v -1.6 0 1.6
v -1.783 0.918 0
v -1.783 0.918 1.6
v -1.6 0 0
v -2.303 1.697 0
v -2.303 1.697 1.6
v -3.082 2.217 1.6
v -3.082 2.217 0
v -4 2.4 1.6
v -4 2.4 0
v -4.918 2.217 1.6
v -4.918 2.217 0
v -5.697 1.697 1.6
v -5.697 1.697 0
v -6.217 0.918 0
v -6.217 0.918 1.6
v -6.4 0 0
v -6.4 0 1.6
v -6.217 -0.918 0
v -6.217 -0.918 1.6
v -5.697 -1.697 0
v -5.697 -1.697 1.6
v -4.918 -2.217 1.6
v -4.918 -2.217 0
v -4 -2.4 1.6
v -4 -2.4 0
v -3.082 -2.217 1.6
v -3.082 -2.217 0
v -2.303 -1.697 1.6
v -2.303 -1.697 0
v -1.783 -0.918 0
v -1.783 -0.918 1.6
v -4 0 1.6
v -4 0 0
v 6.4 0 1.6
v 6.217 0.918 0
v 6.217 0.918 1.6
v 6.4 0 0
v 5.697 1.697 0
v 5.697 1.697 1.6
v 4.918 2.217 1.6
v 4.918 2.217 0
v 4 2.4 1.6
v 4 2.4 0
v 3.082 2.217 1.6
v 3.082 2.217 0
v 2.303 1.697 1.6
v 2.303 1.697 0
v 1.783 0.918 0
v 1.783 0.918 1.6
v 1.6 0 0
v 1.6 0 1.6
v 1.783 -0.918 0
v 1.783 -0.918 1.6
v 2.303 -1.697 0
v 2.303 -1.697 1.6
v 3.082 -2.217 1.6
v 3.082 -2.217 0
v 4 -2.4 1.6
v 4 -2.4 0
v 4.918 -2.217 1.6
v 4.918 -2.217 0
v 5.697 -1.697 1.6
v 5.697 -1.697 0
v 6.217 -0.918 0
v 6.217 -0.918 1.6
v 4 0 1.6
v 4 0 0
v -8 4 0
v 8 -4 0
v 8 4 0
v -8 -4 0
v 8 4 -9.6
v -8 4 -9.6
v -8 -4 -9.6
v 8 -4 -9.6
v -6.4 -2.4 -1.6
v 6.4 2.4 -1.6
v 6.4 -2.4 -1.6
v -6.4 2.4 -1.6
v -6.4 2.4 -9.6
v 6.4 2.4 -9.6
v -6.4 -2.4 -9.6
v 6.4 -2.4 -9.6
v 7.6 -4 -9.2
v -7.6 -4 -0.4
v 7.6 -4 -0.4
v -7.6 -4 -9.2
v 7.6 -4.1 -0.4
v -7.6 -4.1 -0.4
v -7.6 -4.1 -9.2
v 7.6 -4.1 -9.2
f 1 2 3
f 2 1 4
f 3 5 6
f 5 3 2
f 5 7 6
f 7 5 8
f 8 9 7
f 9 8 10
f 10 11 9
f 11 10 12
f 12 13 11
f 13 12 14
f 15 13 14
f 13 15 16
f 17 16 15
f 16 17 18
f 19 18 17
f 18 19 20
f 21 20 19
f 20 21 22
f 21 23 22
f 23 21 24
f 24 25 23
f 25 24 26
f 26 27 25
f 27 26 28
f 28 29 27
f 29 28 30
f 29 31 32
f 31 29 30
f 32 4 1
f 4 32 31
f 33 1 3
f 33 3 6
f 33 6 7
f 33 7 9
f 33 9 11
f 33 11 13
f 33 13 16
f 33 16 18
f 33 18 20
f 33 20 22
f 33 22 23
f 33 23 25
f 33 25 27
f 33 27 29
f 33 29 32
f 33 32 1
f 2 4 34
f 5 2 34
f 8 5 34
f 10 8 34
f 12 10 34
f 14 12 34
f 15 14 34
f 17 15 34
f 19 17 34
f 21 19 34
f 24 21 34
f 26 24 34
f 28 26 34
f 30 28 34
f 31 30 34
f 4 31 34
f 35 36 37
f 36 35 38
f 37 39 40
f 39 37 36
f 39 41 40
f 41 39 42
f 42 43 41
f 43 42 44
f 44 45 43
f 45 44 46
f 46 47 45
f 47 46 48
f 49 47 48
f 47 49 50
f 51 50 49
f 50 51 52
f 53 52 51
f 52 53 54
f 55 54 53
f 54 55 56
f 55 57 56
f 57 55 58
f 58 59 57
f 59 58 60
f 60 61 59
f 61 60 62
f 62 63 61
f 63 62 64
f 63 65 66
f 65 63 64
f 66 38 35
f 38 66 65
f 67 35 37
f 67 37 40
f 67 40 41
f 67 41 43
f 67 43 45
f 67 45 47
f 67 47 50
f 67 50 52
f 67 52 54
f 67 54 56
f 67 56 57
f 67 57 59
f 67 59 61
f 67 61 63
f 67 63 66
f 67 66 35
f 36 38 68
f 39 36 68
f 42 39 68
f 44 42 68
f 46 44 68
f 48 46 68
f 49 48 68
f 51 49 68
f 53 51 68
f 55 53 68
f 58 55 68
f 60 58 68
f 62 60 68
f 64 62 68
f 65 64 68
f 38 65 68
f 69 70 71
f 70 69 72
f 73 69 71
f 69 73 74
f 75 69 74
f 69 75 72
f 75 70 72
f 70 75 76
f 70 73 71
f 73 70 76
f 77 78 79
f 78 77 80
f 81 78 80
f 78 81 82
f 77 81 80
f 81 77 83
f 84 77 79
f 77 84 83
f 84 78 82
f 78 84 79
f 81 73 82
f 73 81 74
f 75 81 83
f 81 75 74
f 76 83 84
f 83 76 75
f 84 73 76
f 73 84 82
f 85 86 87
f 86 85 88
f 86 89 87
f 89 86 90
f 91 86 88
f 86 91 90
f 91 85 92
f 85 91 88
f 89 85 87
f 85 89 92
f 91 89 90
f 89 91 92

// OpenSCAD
// file: ../p/4-4edge.scad
use <../lib.scad>
function ldraw_lib__4_4edge() = [
// 0 Circle 1.0
// 0 Name: 4-4edge.dat
// 0 Author: James Jessiman
// 0 !LDRAW_ORG Primitive UPDATE 2017-01
// 0 !LICENSE Licensed under CC BY 2.0 and CC BY 4.0 : see CAreadme.txt
// 
// 0 BFC CERTIFY CCW
  [0,"BFC","CERTIFY"],
  [0,"BFC","CCW"],
// 
// 0 !HISTORY 1998-12-15 [PTadmin] Official Update 1998-10
// 0 !HISTORY 2005-12-28 [PTadmin] Official Update 2005-01
// 0 !HISTORY 2007-06-24 [PTadmin] Header formatted for Contributor Agreement
// 0 !HISTORY 2008-07-01 [PTadmin] Official Update 2008-01
// 0 !HISTORY 2017-01-15 [Steffen] BFCed
// 0 !HISTORY 2017-12-30 [PTadmin] Official Update 2017-01
// 
// 
// 2 24 1 0 0 0.9239 0 0.3827
  [2,24,1,0,0,0.9239,0,0.3827],
// 2 24 0.9239 0 0.3827 0.7071 0 0.7071
  [2,24,0.9239,0,0.3827,0.7071,0,0.7071],
// 2 24 0.7071 0 0.7071 0.3827 0 0.9239
  [2,24,0.7071,0,0.7071,0.3827,0,0.9239],
// 2 24 0.3827 0 0.9239 0 0 1
  [2,24,0.3827,0,0.9239,0,0,1],
// 2 24 0 0 1 -0.3827 0 0.9239
  [2,24,0,0,1,-0.3827,0,0.9239],
// 2 24 -0.3827 0 0.9239 -0.7071 0 0.7071
  [2,24,-0.3827,0,0.9239,-0.7071,0,0.7071],
// 2 24 -0.7071 0 0.7071 -0.9239 0 0.3827
  [2,24,-0.7071,0,0.7071,-0.9239,0,0.3827],
// 2 24 -0.9239 0 0.3827 -1 0 -0
  [2,24,-0.9239,0,0.3827,-1,0,-0],
// 2 24 -1 0 -0 -0.9239 0 -0.3827
  [2,24,-1,0,-0,-0.9239,0,-0.3827],
// 2 24 -0.9239 0 -0.3827 -0.7071 0 -0.7071
  [2,24,-0.9239,0,-0.3827,-0.7071,0,-0.7071],
// 2 24 -0.7071 0 -0.7071 -0.3827 0 -0.9239
  [2,24,-0.7071,0,-0.7071,-0.3827,0,-0.9239],
// 2 24 -0.3827 0 -0.9239 0 0 -1
  [2,24,-0.3827,0,-0.9239,0,0,-1],
// 2 24 0 0 -1 0.3827 0 -0.9239
  [2,24,0,0,-1,0.3827,0,-0.9239],
// 2 24 0.3827 0 -0.9239 0.7071 0 -0.7071
  [2,24,0.3827,0,-0.9239,0.7071,0,-0.7071],
// 2 24 0.7071 0 -0.7071 0.9239 0 -0.3827
  [2,24,0.7071,0,-0.7071,0.9239,0,-0.3827],
// 2 24 0.9239 0 -0.3827 1 0 0
  [2,24,0.9239,0,-0.3827,1,0,0],
];
module ldraw_lib__4_4edge(step=0, col=false, unit=2/5, alt=false, line=0.2, solid=!$preview)
    makepoly(ldraw_lib__4_4edge(), step=step, col=col, unit=unit, alt=alt, line=line, solid=solid);
ldraw_lib__4_4edge(line=0.2);
// file: ../p/4-4disc.scad
use <../lib.scad>
function ldraw_lib__4_4disc() = [
// 0 Disc 1.0
// 0 Name: 4-4disc.dat
// 0 Author: James Jessiman
// 0 !LDRAW_ORG Primitive UPDATE 2002-02
// 0 !LICENSE Licensed under CC BY 2.0 and CC BY 4.0 : see CAreadme.txt
// 
// 0 BFC CERTIFY CCW
  [0,"BFC","CERTIFY"],
  [0,"BFC","CCW"],
// 
// 0 !HISTORY 1998-12-15 [PTadmin] Official Update 1998-10
// 0 !HISTORY 2002-03-23 [sbliss] Added BFC statement
// 0 !HISTORY 2002-04-25 [PTadmin] Official Update 2002-02
// 0 !HISTORY 2007-06-24 [PTadmin] Header formatted for Contributor Agreement
// 0 !HISTORY 2008-07-01 [PTadmin] Official Update 2008-01
// 
// 
// 3 16 0 0 0 1 0 0 0.9239 0 0.3827
  [3,16,0,0,0,1,0,0,0.9239,0,0.3827],
// 3 16 0 0 0 0.9239 0 0.3827 0.7071 0 0.7071
  [3,16,0,0,0,0.9239,0,0.3827,0.7071,0,0.7071],
// 3 16 0 0 0 0.7071 0 0.7071 0.3827 0 0.9239
  [3,16,0,0,0,0.7071,0,0.7071,0.3827,0,0.9239],
// 3 16 0 0 0 0.3827 0 0.9239 0 0 1
  [3,16,0,0,0,0.3827,0,0.9239,0,0,1],
// 3 16 0 0 0 0 0 1 -0.3827 0 0.9239
  [3,16,0,0,0,0,0,1,-0.3827,0,0.9239],
// 3 16 0 0 0 -0.3827 0 0.9239 -0.7071 0 0.7071
  [3,16,0,0,0,-0.3827,0,0.9239,-0.7071,0,0.7071],
// 3 16 0 0 0 -0.7071 0 0.7071 -0.9239 0 0.3827
  [3,16,0,0,0,-0.7071,0,0.7071,-0.9239,0,0.3827],
// 3 16 0 0 0 -0.9239 0 0.3827 -1 0 -0
  [3,16,0,0,0,-0.9239,0,0.3827,-1,0,-0],
// 3 16 0 0 0 -1 0 -0 -0.9239 0 -0.3827
  [3,16,0,0,0,-1,0,-0,-0.9239,0,-0.3827],
// 3 16 0 0 0 -0.9239 0 -0.3827 -0.7071 0 -0.7071
  [3,16,0,0,0,-0.9239,0,-0.3827,-0.7071,0,-0.7071],
// 3 16 0 0 0 -0.7071 0 -0.7071 -0.3827 0 -0.9239
  [3,16,0,0,0,-0.7071,0,-0.7071,-0.3827,0,-0.9239],
// 3 16 0 0 0 -0.3827 0 -0.9239 0 0 -1
  [3,16,0,0,0,-0.3827,0,-0.9239,0,0,-1],
// 3 16 0 0 0 0 0 -1 0.3827 0 -0.9239
  [3,16,0,0,0,0,0,-1,0.3827,0,-0.9239],
// 3 16 0 0 0 0.3827 0 -0.9239 0.7071 0 -0.7071
  [3,16,0,0,0,0.3827,0,-0.9239,0.7071,0,-0.7071],
// 3 16 0 0 0 0.7071 0 -0.7071 0.9239 0 -0.3827
  [3,16,0,0,0,0.7071,0,-0.7071,0.9239,0,-0.3827],
// 3 16 0 0 0 0.9239 0 -0.3827 1 0 0
  [3,16,0,0,0,0.9239,0,-0.3827,1,0,0],
// 0
];
module ldraw_lib__4_4disc(step=0, col=false, unit=2/5, alt=false, line=0.2, solid=!$preview)
    makepoly(ldraw_lib__4_4disc(), step=step, col=col, unit=unit, alt=alt, line=line, solid=solid);
ldraw_lib__4_4disc(line=0.2);
// file: ../p/4-4cyli.scad
use <../lib.scad>
$fa=1; $fs=0.2;
function ldraw_lib__4_4cyli(realsolid=false) = [
// 0 Cylinder 1.0
// 0 Name: 4-4cyli.dat
// 0 Author: James Jessiman
// 0 !LDRAW_ORG Primitive UPDATE 2005-01
// 0 !LICENSE Licensed under CC BY 2.0 and CC BY 4.0 : see CAreadme.txt
// 
// 0 BFC CERTIFY CCW
  [0,"BFC","CERTIFY"],
  [0,"BFC","CCW"],
// 
// 0 !HISTORY 1998-12-15 [PTadmin] Official Update 1998-10
// 0 !HISTORY 2002-03-23 [sbliss] Added BFC statement; merged headers from files in distributions LDraw 0.27 and Complete.
// 0 !HISTORY 2002-04-25 [PTadmin] Official Update 2002-02
// 0 !HISTORY 2004-12-14 [guyvivan] BFC CCW
// 0 !HISTORY 2005-12-28 [PTadmin] Official Update 2005-01
// 0 !HISTORY 2007-06-24 [PTadmin] Header formatted for Contributor Agreement
// 0 !HISTORY 2008-07-01 [PTadmin] Official Update 2008-01
// 
// 
// 4 16 1 1 0 0.9239 1 0.3827 0.9239 0 0.3827 1 0 0
  [4,16,1,1,0,0.9239,1,0.3827,0.9239,0,0.3827,1,0,0],
// 5 24 1 0 0 1 1 0 0.9239 0 0.3827 0.9239 0 -0.3827
  [5,24,1,0,0,1,1,0,0.9239,0,0.3827,0.9239,0,-0.3827],
// 4 16 0.9239 1 0.3827 0.7071 1 0.7071 0.7071 0 0.7071 0.9239 0 0.3827
  [4,16,0.9239,1,0.3827,0.7071,1,0.7071,0.7071,0,0.7071,0.9239,0,0.3827],
// 5 24 0.9239 0 0.3827 0.9239 1 0.3827 0.7071 0 0.7071 1 0 0
  [5,24,0.9239,0,0.3827,0.9239,1,0.3827,0.7071,0,0.7071,1,0,0],
// 4 16 0.7071 1 0.7071 0.3827 1 0.9239 0.3827 0 0.9239 0.7071 0 0.7071
  [4,16,0.7071,1,0.7071,0.3827,1,0.9239,0.3827,0,0.9239,0.7071,0,0.7071],
// 5 24 0.7071 0 0.7071 0.7071 1 0.7071 0.3827 0 0.9239 0.9239 0 0.3827
  [5,24,0.7071,0,0.7071,0.7071,1,0.7071,0.3827,0,0.9239,0.9239,0,0.3827],
// 4 16 0.3827 1 0.9239 0 1 1 0 0 1 0.3827 0 0.9239
  [4,16,0.3827,1,0.9239,0,1,1,0,0,1,0.3827,0,0.9239],
// 5 24 0.3827 0 0.9239 0.3827 1 0.9239 0 0 1 0.7071 0 0.7071
  [5,24,0.3827,0,0.9239,0.3827,1,0.9239,0,0,1,0.7071,0,0.7071],
// 4 16 0 1 1 -0.3827 1 0.9239 -0.3827 0 0.9239 0 0 1
  [4,16,0,1,1,-0.3827,1,0.9239,-0.3827,0,0.9239,0,0,1],
// 5 24 0 0 1 0 1 1 -0.3827 0 0.9239 0.3827 0 0.9239
  [5,24,0,0,1,0,1,1,-0.3827,0,0.9239,0.3827,0,0.9239],
// 4 16 -0.3827 1 0.9239 -0.7071 1 0.7071 -0.7071 0 0.7071 -0.3827 0 0.9239
  [4,16,-0.3827,1,0.9239,-0.7071,1,0.7071,-0.7071,0,0.7071,-0.3827,0,0.9239],
// 5 24 -0.3827 0 0.9239 -0.3827 1 0.9239 -0.7071 0 0.7071 0 0 1
  [5,24,-0.3827,0,0.9239,-0.3827,1,0.9239,-0.7071,0,0.7071,0,0,1],
// 4 16 -0.7071 1 0.7071 -0.9239 1 0.3827 -0.9239 0 0.3827 -0.7071 0 0.7071
  [4,16,-0.7071,1,0.7071,-0.9239,1,0.3827,-0.9239,0,0.3827,-0.7071,0,0.7071],
// 5 24 -0.7071 0 0.7071 -0.7071 1 0.7071 -0.9239 0 0.3827 -0.3827 0 0.9239
  [5,24,-0.7071,0,0.7071,-0.7071,1,0.7071,-0.9239,0,0.3827,-0.3827,0,0.9239],
// 4 16 -0.9239 1 0.3827 -1 1 0 -1 0 0 -0.9239 0 0.3827
  [4,16,-0.9239,1,0.3827,-1,1,0,-1,0,0,-0.9239,0,0.3827],
// 5 24 -0.9239 0 0.3827 -0.9239 1 0.3827 -1 0 0 -0.7071 0 0.7071
  [5,24,-0.9239,0,0.3827,-0.9239,1,0.3827,-1,0,0,-0.7071,0,0.7071],
// 4 16 -1 1 0 -0.9239 1 -0.3827 -0.9239 0 -0.3827 -1 0 0
  [4,16,-1,1,0,-0.9239,1,-0.3827,-0.9239,0,-0.3827,-1,0,0],
// 5 24 -1 0 0 -1 1 0 -0.9239 0 -0.3827 -0.9239 0 0.3827
  [5,24,-1,0,0,-1,1,0,-0.9239,0,-0.3827,-0.9239,0,0.3827],
// 4 16 -0.9239 1 -0.3827 -0.7071 1 -0.7071 -0.7071 0 -0.7071 -0.9239 0 -0.3827
  [4,16,-0.9239,1,-0.3827,-0.7071,1,-0.7071,-0.7071,0,-0.7071,-0.9239,0,-0.3827],
// 5 24 -0.9239 0 -0.3827 -0.9239 1 -0.3827 -0.7071 0 -0.7071 -1 0 0
  [5,24,-0.9239,0,-0.3827,-0.9239,1,-0.3827,-0.7071,0,-0.7071,-1,0,0],
// 4 16 -0.7071 1 -0.7071 -0.3827 1 -0.9239 -0.3827 0 -0.9239 -0.7071 0 -0.7071
  [4,16,-0.7071,1,-0.7071,-0.3827,1,-0.9239,-0.3827,0,-0.9239,-0.7071,0,-0.7071],
// 5 24 -0.7071 0 -0.7071 -0.7071 1 -0.7071 -0.3827 0 -0.9239 -0.9239 0 -0.3827
  [5,24,-0.7071,0,-0.7071,-0.7071,1,-0.7071,-0.3827,0,-0.9239,-0.9239,0,-0.3827],
// 4 16 -0.3827 1 -0.9239 0 1 -1 0 0 -1 -0.3827 0 -0.9239
  [4,16,-0.3827,1,-0.9239,0,1,-1,0,0,-1,-0.3827,0,-0.9239],
// 5 24 -0.3827 0 -0.9239 -0.3827 1 -0.9239 0 0 -1 -0.7071 0 -0.7071
  [5,24,-0.3827,0,-0.9239,-0.3827,1,-0.9239,0,0,-1,-0.7071,0,-0.7071],
// 4 16 0 1 -1 0.3827 1 -0.9239 0.3827 0 -0.9239 0 0 -1
  [4,16,0,1,-1,0.3827,1,-0.9239,0.3827,0,-0.9239,0,0,-1],
// 5 24 0 0 -1 0 1 -1 0.3827 0 -0.9239 -0.3827 0 -0.9239
  [5,24,0,0,-1,0,1,-1,0.3827,0,-0.9239,-0.3827,0,-0.9239],
// 4 16 0.3827 1 -0.9239 0.7071 1 -0.7071 0.7071 0 -0.7071 0.3827 0 -0.9239
  [4,16,0.3827,1,-0.9239,0.7071,1,-0.7071,0.7071,0,-0.7071,0.3827,0,-0.9239],
// 5 24 0.3827 0 -0.9239 0.3827 1 -0.9239 0.7071 0 -0.7071 0 0 -1
  [5,24,0.3827,0,-0.9239,0.3827,1,-0.9239,0.7071,0,-0.7071,0,0,-1],
// 4 16 0.7071 1 -0.7071 0.9239 1 -0.3827 0.9239 0 -0.3827 0.7071 0 -0.7071
  [4,16,0.7071,1,-0.7071,0.9239,1,-0.3827,0.9239,0,-0.3827,0.7071,0,-0.7071],
// 5 24 0.7071 0 -0.7071 0.7071 1 -0.7071 0.9239 0 -0.3827 0.3827 0 -0.9239
  [5,24,0.7071,0,-0.7071,0.7071,1,-0.7071,0.9239,0,-0.3827,0.3827,0,-0.9239],
// 4 16 0.9239 1 -0.3827 1 1 0 1 0 0 0.9239 0 -0.3827
  [4,16,0.9239,1,-0.3827,1,1,0,1,0,0,0.9239,0,-0.3827],
// 5 24 0.9239 0 -0.3827 0.9239 1 -0.3827 1 0 0 0.7071 0 -0.7071
  [5,24,0.9239,0,-0.3827,0.9239,1,-0.3827,1,0,0,0.7071,0,-0.7071],
// 0
];
module ldraw_lib__4_4cyli(step=0, col=false, unit=2/5, alt=false, line=0.2, solid=!$preview)
    makepoly(ldraw_lib__4_4cyli(solid), step=step, col=col, unit=unit, alt=alt, line=line, solid=solid);
ldraw_lib__4_4cyli(line=0.2);
// file: ../p/stud.scad
use <../lib.scad>
use <4-4cyli.scad>
use <4-4disc.scad>
use <4-4edge.scad>
function ldraw_lib__stud() = [
// 0 Stud
// 0 Name: stud.dat
// 0 Author: James Jessiman
// 0 !LDRAW_ORG Primitive UPDATE 2012-01
// 0 !LICENSE Licensed under CC BY 4.0 : see CAreadme.txt
// 
// 0 BFC CERTIFY CCW
  [0,"BFC","CERTIFY"],
  [0,"BFC","CCW"],
// 
// 0 !HISTORY 2002-04-04 [sbliss] Modified for BFC compliance
// 0 !HISTORY 2002-04-25 [PTadmin] Official Update 2002-02
// 0 !HISTORY 2007-06-24 [PTadmin] Header formatted for Contributor Agreement
// 0 !HISTORY 2008-07-01 [PTadmin] Official Update 2008-01
// 0 !HISTORY 2012-02-16 [Philo] Changed to CCW
// 0 !HISTORY 2012-03-30 [PTadmin] Official Update 2012-01
// 
// 
// 1 16 0 0 0 6 0 0 0 1 0 0 0 6 4-4edge.dat
  [1,16,0,0,0,6,0,0,0,1,0,0,0,6, ldraw_lib__4_4edge()],
// 1 16 0 -4 0 6 0 0 0 1 0 0 0 6 4-4edge.dat
  [1,16,0,-4,0,6,0,0,0,1,0,0,0,6, ldraw_lib__4_4edge()],
// 1 16 0 0 0 6 0 0 0 -4 0 0 0 6 4-4cyli.dat
  [1,16,0,0,0,6,0,0,0,-4,0,0,0,6, ldraw_lib__4_4cyli()],
// 1 16 0 -4 0 6 0 0 0 1 0 0 0 6 4-4disc.dat
  [1,16,0,-4,0,6,0,0,0,1,0,0,0,6, ldraw_lib__4_4disc()],
  [-1,16,0,0,0,6,0,0,0,-1,0,0,0,6, ldraw_lib__4_4disc()],
];
module ldraw_lib__stud(step=0, col=false, unit=2/5, alt=false, line=0.2, solid=!$preview)
    makepoly(ldraw_lib__stud(), step=step, col=col, unit=unit, alt=alt, line=line, solid=solid);
ldraw_lib__stud(line=0.2);
// file: ../p/stug-1x2.scad
use <../lib.scad>
use <stud.scad>
$fa=1; $fs=0.2;
function ldraw_lib__stug_1x2(realsolid=false) = [
// 0 Stud Group  1 x  2
// 0 Name: stug-1x2.dat
// 0 Author: Steffen [Steffen]
// 0 !LDRAW_ORG Primitive UPDATE 2011-01
// 0 !LICENSE Licensed under CC BY 2.0 and CC BY 4.0 : see CAreadme.txt
// 
// 0 BFC CERTIFY CCW
  [0,"BFC","CERTIFY"],
  [0,"BFC","CCW"],
// 
// 0 !HISTORY 2011-07-25 [PTadmin] Official Update 2011-01
// 
// 
// 1 16 -10 0 0 1 0 0 0 1 0 0 0 1 stud.dat
  [1,16,-10,0,0,1,0,0,0,1,0,0,0,1, ldraw_lib__stud(realsolid)],
// 1 16 10 0 0 1 0 0 0 1 0 0 0 1 stud.dat
  [1,16,10,0,0,1,0,0,0,1,0,0,0,1, ldraw_lib__stud(realsolid)],
];
module ldraw_lib__stug_1x2(step=0, col=false, unit=2/5, alt=false, line=0.2, solid=!$preview)
    makepoly(ldraw_lib__stug_1x2(solid), step=step, col=col, unit=unit, alt=alt, line=line, solid=solid);
ldraw_lib__stug_1x2(line=0.2);
// file: ../p/box5.scad
use <../lib.scad>
function ldraw_lib__box5() = [
// 0 Box with 5 Faces and All Edges
// 0 Name: box5.dat
// 0 Author: James Jessiman
// 0 !LDRAW_ORG Primitive UPDATE 2012-01
// 0 !LICENSE Licensed under CC BY 2.0 and CC BY 4.0 : see CAreadme.txt
// 
// 0 BFC CERTIFY CCW
  [0,"BFC","CERTIFY"],
  [0,"BFC","CCW"],
// 
// 0 !HISTORY 2002-04-03 [sbliss] Modified for BFC compliance
// 0 !HISTORY 2002-04-25 [PTadmin] Official Update 2002-02
// 0 !HISTORY 2007-06-24 [PTadmin] Header formatted for Contributor Agreement
// 0 !HISTORY 2008-07-01 [PTadmin] Official Update 2008-01
// 0 !HISTORY 2012-02-16 [Philo] Changed to CCW
// 0 !HISTORY 2012-03-30 [PTadmin] Official Update 2012-01
// 
// 
// 2 24 1 1 1 -1 1 1
  [2,24,1,1,1,-1,1,1],
// 2 24 -1 1 1 -1 1 -1
  [2,24,-1,1,1,-1,1,-1],
// 2 24 -1 1 -1 1 1 -1
  [2,24,-1,1,-1,1,1,-1],
// 2 24 1 1 -1 1 1 1
  [2,24,1,1,-1,1,1,1],
// 2 24 1 0 1 -1 0 1
  [2,24,1,0,1,-1,0,1],
// 2 24 -1 0 1 -1 0 -1
  [2,24,-1,0,1,-1,0,-1],
// 2 24 -1 0 -1 1 0 -1
  [2,24,-1,0,-1,1,0,-1],
// 2 24 1 0 -1 1 0 1
  [2,24,1,0,-1,1,0,1],
// 2 24 1 0 1 1 1 1
  [2,24,1,0,1,1,1,1],
// 2 24 -1 0 1 -1 1 1
  [2,24,-1,0,1,-1,1,1],
// 2 24 1 0 -1 1 1 -1
  [2,24,1,0,-1,1,1,-1],
// 2 24 -1 0 -1 -1 1 -1
  [2,24,-1,0,-1,-1,1,-1],
// 4 16 -1 1 1 1 1 1 1 1 -1 -1 1 -1
  [4,16,-1,1,1,1,1,1,1,1,-1,-1,1,-1],
// 4 16 -1 1 1 -1 0 1 1 0 1 1 1 1
  [4,16,-1,1,1,-1,0,1,1,0,1,1,1,1],
// 4 16 -1 1 -1 -1 0 -1 -1 0 1 -1 1 1
  [4,16,-1,1,-1,-1,0,-1,-1,0,1,-1,1,1],
// 4 16 1 1 -1 1 0 -1 -1 0 -1 -1 1 -1
  [4,16,1,1,-1,1,0,-1,-1,0,-1,-1,1,-1],
// 4 16 1 1 1 1 0 1 1 0 -1 1 1 -1
  [4,16,1,1,1,1,0,1,1,0,-1,1,1,-1],
];
makepoly(ldraw_lib__box5(), line=0.2);
// file: ../p/box5-12.scad
use <../lib.scad>
function ldraw_lib__box5_12() = [
// 0 Box with 5 Faces without Any Edges
// 0 Name: box5-12.dat
// 0 Author: Chris Dee [cwdee]
// 0 !LDRAW_ORG Primitive UPDATE 2009-02
// 0 !LICENSE Licensed under CC BY 2.0 and CC BY 4.0 : see CAreadme.txt
// 
// 0 BFC CERTIFY CCW
  [0,"BFC","CERTIFY"],
  [0,"BFC","CCW"],
// 
// 0 !HISTORY 2009-09-03 [PTadmin] Official Update 2009-02
// 
// 
// 4 16 1 1 1 1 1 -1 -1 1 -1 -1 1 1
  [4,16,1,1,1,1,1,-1,-1,1,-1,-1,1,1],
// 4 16 -1 0 1 1 0 1 1 1 1 -1 1 1
  [4,16,-1,0,1,1,0,1,1,1,1,-1,1,1],
// 4 16 -1 0 -1 -1 0 1 -1 1 1 -1 1 -1
  [4,16,-1,0,-1,-1,0,1,-1,1,1,-1,1,-1],
// 4 16 1 0 -1 -1 0 -1 -1 1 -1 1 1 -1
  [4,16,1,0,-1,-1,0,-1,-1,1,-1,1,1,-1],
// 4 16 1 0 1 1 0 -1 1 1 -1 1 1 1
  [4,16,1,0,1,1,0,-1,1,1,-1,1,1,1],
// 0
];
module ldraw_lib__box5_12(step=0, col=false, unit=2/5, alt=false, line=0.2, solid=!$preview)
    makepoly(ldraw_lib__box5_12(), step=step, col=col, unit=unit, alt=alt, line=line, solid=solid);
ldraw_lib__box5_12(line=0.2);
// file: 3065.scad
use <../lib.scad>
use <../p/box5.scad>
use <../p/stug-1x2.scad>
$fa=1; $fs=0.2;
function ldraw_lib__3065(realsolid=false) = [
// 0 Brick  1 x  2 without Centre Stud
// 0 Name: 3065.dat
// 0 Author: James Jessiman
// 0 !LDRAW_ORG Part UPDATE 2012-01
// 0 !LICENSE Licensed under CC BY 2.0 and CC BY 4.0 : see CAreadme.txt
// 
// 0 BFC CERTIFY CCW
  [0,"BFC","CERTIFY"],
  [0,"BFC","CCW"],
// 
// 0 !HISTORY 2007-12-20 [PTadmin] Header formatted for Contributor Agreement
// 0 !HISTORY 2008-07-01 [PTadmin] Official Update 2008-01
// 0 !HISTORY 2012-03-11 [Steffen] BFCed
// 0 !HISTORY 2012-03-30 [PTadmin] Official Update 2012-01
// 
// 
// 1 16 0 0 0 1 0 0 0 1 0 0 0 1 stug-1x2.dat
  [1,16,0,0,0,1,0,0,0,1,0,0,0,1, ldraw_lib__stug_1x2(realsolid)],
// 1 16 0 24 0 20 0 0 0 -24 0 0 0 10 box5.dat
  [1,16,0,24,0,20,0,0,0,-24,0,0,0,10, ldraw_lib__box5(realsolid)],
// 0 BFC INVERTNEXT
  [0,"BFC","INVERTNEXT"],
// 1 16 0 24 0 16 0 0 0 -20 0 0 0 6 box5.dat
  [1,16,0,24,0,16,0,0,0,-20,0,0,0,6, ldraw_lib__box5(realsolid)],
// 4 16 20 24 10 16 24 6 -16 24 6 -20 24 10
  [4,16,20,24,10,16,24,6,-16,24,6,-20,24,10],
// 4 16 -20 24 10 -16 24 6 -16 24 -6 -20 24 -10
  [4,16,-20,24,10,-16,24,6,-16,24,-6,-20,24,-10],
// 4 16 -20 24 -10 -16 24 -6 16 24 -6 20 24 -10
  [4,16,-20,24,-10,-16,24,-6,16,24,-6,20,24,-10],
// 4 16 20 24 -10 16 24 -6 16 24 6 20 24 10
  [4,16,20,24,-10,16,24,-6,16,24,6,20,24,10],
];
module ldraw_lib__3065(step=0, col=false, unit=2/5, alt=false, line=0.2, solid=!$preview)
    makepoly(ldraw_lib__3065(solid), step=step, col=col, unit=unit, alt=alt, line=line, solid=solid);
ldraw_lib__3065(line=0.2);
// file: 162275g.scad
use <../lib.scad>
use <../p/box5-12.scad>
function ldraw_lib__162275g() = [
// 0 Sticker  1.1 x  1.9 with White Rectangle
// 0 Name: 162275g.dat
// 0 Author: Takeshi Takahashi [RainbowDolphin]
// 0 !LDRAW_ORG Part UPDATE 2023-03
// 0 !LICENSE Licensed under CC BY 4.0 : see CAreadme.txt
// 
// 0 BFC CERTIFY CCW
  [0,"BFC","CERTIFY"],
  [0,"BFC","CCW"],
// 
// 0 !KEYWORDS Bricklink 5550stk01, Brickowl 321461, Custom Rally Van, Model Team
// 0 !KEYWORDS Rebrickable 162275, Set 5550, truck
// 
// 0 !HISTORY 2023-06-24 [OrionP] Official Update 2023-03
// 
// 
// 1 16 0 -0.25 0 19 0 0 0 0.25 0 0 0 11 box5-12.dat
  [1,16,0,-0.25,0,19,0,0,0,0.25,0,0,0,11, ldraw_lib__box5_12()],
// 0 BFC NOCLIP
  [0,"BFC","NOCLIP"],
// 4 15 19 -0.25 11 -19 -0.25 11 -19 -0.25 -11 19 -0.25 -11
  [4,15,19,-0.25,11,-19,-0.25,11,-19,-0.25,-11,19,-0.25,-11],
];
module ldraw_lib__162275g(step=0, col=false, unit=2/5, alt=false, line=0.2, solid=!$preview)
    makepoly(ldraw_lib__162275g(), step=step, col=col, unit=unit, alt=alt, line=line, solid=solid);
ldraw_lib__162275g(line=0.2);
// main file
use <../lib.scad>
use <162275g.scad>
use <3065.scad>
function ldraw_lib__3065d03() = [
// 0 Brick  1 x  2 without Centre Stud with White Sticker
// 0 Name: 3065d03.dat
// 0 Author: Takeshi Takahashi [RainbowDolphin]
// 0 !LDRAW_ORG Shortcut UPDATE 2024-10
// 0 !LICENSE Licensed under CC BY 4.0 : see CAreadme.txt
// 
// 0 !HELP The sticker is intentionally coloured to white,
// 0 !HELP as the white backside is used for a headlamp reflector.
// 
// 0 BFC CERTIFY CCW
  [0,"BFC","CERTIFY"],
  [0,"BFC","CCW"],
// 
// 0 !CATEGORY Sticker Shortcut
// 0 !KEYWORDS Bricklink 3065pb02, Custom Rally Van, Model Team, Set 5550
// 
// 0 !HISTORY 2024-12-01 [OrionP] Official Update 2024-10
// 
// 1 16 0 0 0 1 0 0 0 1 0 0 0 1 3065.dat
  [1,16,0,0,0,1,0,0,0,1,0,0,0,1, ldraw_lib__3065()],
// 1 15 0 12 -10 1 0 0 0 0 -1 0 1 0 162275g.dat
  [1,15,0,12,-10,1,0,0,0,0,-1,0,1,0, ldraw_lib__162275g()],
];
module ldraw_lib__3065d03(step=0, col=false, unit=2/5, alt=false, line=0.2, solid=!$preview)
    makepoly(ldraw_lib__3065d03(), step=step, col=col, unit=unit, alt=alt, line=line, solid=solid);
ldraw_lib__3065d03(line=0.2);
